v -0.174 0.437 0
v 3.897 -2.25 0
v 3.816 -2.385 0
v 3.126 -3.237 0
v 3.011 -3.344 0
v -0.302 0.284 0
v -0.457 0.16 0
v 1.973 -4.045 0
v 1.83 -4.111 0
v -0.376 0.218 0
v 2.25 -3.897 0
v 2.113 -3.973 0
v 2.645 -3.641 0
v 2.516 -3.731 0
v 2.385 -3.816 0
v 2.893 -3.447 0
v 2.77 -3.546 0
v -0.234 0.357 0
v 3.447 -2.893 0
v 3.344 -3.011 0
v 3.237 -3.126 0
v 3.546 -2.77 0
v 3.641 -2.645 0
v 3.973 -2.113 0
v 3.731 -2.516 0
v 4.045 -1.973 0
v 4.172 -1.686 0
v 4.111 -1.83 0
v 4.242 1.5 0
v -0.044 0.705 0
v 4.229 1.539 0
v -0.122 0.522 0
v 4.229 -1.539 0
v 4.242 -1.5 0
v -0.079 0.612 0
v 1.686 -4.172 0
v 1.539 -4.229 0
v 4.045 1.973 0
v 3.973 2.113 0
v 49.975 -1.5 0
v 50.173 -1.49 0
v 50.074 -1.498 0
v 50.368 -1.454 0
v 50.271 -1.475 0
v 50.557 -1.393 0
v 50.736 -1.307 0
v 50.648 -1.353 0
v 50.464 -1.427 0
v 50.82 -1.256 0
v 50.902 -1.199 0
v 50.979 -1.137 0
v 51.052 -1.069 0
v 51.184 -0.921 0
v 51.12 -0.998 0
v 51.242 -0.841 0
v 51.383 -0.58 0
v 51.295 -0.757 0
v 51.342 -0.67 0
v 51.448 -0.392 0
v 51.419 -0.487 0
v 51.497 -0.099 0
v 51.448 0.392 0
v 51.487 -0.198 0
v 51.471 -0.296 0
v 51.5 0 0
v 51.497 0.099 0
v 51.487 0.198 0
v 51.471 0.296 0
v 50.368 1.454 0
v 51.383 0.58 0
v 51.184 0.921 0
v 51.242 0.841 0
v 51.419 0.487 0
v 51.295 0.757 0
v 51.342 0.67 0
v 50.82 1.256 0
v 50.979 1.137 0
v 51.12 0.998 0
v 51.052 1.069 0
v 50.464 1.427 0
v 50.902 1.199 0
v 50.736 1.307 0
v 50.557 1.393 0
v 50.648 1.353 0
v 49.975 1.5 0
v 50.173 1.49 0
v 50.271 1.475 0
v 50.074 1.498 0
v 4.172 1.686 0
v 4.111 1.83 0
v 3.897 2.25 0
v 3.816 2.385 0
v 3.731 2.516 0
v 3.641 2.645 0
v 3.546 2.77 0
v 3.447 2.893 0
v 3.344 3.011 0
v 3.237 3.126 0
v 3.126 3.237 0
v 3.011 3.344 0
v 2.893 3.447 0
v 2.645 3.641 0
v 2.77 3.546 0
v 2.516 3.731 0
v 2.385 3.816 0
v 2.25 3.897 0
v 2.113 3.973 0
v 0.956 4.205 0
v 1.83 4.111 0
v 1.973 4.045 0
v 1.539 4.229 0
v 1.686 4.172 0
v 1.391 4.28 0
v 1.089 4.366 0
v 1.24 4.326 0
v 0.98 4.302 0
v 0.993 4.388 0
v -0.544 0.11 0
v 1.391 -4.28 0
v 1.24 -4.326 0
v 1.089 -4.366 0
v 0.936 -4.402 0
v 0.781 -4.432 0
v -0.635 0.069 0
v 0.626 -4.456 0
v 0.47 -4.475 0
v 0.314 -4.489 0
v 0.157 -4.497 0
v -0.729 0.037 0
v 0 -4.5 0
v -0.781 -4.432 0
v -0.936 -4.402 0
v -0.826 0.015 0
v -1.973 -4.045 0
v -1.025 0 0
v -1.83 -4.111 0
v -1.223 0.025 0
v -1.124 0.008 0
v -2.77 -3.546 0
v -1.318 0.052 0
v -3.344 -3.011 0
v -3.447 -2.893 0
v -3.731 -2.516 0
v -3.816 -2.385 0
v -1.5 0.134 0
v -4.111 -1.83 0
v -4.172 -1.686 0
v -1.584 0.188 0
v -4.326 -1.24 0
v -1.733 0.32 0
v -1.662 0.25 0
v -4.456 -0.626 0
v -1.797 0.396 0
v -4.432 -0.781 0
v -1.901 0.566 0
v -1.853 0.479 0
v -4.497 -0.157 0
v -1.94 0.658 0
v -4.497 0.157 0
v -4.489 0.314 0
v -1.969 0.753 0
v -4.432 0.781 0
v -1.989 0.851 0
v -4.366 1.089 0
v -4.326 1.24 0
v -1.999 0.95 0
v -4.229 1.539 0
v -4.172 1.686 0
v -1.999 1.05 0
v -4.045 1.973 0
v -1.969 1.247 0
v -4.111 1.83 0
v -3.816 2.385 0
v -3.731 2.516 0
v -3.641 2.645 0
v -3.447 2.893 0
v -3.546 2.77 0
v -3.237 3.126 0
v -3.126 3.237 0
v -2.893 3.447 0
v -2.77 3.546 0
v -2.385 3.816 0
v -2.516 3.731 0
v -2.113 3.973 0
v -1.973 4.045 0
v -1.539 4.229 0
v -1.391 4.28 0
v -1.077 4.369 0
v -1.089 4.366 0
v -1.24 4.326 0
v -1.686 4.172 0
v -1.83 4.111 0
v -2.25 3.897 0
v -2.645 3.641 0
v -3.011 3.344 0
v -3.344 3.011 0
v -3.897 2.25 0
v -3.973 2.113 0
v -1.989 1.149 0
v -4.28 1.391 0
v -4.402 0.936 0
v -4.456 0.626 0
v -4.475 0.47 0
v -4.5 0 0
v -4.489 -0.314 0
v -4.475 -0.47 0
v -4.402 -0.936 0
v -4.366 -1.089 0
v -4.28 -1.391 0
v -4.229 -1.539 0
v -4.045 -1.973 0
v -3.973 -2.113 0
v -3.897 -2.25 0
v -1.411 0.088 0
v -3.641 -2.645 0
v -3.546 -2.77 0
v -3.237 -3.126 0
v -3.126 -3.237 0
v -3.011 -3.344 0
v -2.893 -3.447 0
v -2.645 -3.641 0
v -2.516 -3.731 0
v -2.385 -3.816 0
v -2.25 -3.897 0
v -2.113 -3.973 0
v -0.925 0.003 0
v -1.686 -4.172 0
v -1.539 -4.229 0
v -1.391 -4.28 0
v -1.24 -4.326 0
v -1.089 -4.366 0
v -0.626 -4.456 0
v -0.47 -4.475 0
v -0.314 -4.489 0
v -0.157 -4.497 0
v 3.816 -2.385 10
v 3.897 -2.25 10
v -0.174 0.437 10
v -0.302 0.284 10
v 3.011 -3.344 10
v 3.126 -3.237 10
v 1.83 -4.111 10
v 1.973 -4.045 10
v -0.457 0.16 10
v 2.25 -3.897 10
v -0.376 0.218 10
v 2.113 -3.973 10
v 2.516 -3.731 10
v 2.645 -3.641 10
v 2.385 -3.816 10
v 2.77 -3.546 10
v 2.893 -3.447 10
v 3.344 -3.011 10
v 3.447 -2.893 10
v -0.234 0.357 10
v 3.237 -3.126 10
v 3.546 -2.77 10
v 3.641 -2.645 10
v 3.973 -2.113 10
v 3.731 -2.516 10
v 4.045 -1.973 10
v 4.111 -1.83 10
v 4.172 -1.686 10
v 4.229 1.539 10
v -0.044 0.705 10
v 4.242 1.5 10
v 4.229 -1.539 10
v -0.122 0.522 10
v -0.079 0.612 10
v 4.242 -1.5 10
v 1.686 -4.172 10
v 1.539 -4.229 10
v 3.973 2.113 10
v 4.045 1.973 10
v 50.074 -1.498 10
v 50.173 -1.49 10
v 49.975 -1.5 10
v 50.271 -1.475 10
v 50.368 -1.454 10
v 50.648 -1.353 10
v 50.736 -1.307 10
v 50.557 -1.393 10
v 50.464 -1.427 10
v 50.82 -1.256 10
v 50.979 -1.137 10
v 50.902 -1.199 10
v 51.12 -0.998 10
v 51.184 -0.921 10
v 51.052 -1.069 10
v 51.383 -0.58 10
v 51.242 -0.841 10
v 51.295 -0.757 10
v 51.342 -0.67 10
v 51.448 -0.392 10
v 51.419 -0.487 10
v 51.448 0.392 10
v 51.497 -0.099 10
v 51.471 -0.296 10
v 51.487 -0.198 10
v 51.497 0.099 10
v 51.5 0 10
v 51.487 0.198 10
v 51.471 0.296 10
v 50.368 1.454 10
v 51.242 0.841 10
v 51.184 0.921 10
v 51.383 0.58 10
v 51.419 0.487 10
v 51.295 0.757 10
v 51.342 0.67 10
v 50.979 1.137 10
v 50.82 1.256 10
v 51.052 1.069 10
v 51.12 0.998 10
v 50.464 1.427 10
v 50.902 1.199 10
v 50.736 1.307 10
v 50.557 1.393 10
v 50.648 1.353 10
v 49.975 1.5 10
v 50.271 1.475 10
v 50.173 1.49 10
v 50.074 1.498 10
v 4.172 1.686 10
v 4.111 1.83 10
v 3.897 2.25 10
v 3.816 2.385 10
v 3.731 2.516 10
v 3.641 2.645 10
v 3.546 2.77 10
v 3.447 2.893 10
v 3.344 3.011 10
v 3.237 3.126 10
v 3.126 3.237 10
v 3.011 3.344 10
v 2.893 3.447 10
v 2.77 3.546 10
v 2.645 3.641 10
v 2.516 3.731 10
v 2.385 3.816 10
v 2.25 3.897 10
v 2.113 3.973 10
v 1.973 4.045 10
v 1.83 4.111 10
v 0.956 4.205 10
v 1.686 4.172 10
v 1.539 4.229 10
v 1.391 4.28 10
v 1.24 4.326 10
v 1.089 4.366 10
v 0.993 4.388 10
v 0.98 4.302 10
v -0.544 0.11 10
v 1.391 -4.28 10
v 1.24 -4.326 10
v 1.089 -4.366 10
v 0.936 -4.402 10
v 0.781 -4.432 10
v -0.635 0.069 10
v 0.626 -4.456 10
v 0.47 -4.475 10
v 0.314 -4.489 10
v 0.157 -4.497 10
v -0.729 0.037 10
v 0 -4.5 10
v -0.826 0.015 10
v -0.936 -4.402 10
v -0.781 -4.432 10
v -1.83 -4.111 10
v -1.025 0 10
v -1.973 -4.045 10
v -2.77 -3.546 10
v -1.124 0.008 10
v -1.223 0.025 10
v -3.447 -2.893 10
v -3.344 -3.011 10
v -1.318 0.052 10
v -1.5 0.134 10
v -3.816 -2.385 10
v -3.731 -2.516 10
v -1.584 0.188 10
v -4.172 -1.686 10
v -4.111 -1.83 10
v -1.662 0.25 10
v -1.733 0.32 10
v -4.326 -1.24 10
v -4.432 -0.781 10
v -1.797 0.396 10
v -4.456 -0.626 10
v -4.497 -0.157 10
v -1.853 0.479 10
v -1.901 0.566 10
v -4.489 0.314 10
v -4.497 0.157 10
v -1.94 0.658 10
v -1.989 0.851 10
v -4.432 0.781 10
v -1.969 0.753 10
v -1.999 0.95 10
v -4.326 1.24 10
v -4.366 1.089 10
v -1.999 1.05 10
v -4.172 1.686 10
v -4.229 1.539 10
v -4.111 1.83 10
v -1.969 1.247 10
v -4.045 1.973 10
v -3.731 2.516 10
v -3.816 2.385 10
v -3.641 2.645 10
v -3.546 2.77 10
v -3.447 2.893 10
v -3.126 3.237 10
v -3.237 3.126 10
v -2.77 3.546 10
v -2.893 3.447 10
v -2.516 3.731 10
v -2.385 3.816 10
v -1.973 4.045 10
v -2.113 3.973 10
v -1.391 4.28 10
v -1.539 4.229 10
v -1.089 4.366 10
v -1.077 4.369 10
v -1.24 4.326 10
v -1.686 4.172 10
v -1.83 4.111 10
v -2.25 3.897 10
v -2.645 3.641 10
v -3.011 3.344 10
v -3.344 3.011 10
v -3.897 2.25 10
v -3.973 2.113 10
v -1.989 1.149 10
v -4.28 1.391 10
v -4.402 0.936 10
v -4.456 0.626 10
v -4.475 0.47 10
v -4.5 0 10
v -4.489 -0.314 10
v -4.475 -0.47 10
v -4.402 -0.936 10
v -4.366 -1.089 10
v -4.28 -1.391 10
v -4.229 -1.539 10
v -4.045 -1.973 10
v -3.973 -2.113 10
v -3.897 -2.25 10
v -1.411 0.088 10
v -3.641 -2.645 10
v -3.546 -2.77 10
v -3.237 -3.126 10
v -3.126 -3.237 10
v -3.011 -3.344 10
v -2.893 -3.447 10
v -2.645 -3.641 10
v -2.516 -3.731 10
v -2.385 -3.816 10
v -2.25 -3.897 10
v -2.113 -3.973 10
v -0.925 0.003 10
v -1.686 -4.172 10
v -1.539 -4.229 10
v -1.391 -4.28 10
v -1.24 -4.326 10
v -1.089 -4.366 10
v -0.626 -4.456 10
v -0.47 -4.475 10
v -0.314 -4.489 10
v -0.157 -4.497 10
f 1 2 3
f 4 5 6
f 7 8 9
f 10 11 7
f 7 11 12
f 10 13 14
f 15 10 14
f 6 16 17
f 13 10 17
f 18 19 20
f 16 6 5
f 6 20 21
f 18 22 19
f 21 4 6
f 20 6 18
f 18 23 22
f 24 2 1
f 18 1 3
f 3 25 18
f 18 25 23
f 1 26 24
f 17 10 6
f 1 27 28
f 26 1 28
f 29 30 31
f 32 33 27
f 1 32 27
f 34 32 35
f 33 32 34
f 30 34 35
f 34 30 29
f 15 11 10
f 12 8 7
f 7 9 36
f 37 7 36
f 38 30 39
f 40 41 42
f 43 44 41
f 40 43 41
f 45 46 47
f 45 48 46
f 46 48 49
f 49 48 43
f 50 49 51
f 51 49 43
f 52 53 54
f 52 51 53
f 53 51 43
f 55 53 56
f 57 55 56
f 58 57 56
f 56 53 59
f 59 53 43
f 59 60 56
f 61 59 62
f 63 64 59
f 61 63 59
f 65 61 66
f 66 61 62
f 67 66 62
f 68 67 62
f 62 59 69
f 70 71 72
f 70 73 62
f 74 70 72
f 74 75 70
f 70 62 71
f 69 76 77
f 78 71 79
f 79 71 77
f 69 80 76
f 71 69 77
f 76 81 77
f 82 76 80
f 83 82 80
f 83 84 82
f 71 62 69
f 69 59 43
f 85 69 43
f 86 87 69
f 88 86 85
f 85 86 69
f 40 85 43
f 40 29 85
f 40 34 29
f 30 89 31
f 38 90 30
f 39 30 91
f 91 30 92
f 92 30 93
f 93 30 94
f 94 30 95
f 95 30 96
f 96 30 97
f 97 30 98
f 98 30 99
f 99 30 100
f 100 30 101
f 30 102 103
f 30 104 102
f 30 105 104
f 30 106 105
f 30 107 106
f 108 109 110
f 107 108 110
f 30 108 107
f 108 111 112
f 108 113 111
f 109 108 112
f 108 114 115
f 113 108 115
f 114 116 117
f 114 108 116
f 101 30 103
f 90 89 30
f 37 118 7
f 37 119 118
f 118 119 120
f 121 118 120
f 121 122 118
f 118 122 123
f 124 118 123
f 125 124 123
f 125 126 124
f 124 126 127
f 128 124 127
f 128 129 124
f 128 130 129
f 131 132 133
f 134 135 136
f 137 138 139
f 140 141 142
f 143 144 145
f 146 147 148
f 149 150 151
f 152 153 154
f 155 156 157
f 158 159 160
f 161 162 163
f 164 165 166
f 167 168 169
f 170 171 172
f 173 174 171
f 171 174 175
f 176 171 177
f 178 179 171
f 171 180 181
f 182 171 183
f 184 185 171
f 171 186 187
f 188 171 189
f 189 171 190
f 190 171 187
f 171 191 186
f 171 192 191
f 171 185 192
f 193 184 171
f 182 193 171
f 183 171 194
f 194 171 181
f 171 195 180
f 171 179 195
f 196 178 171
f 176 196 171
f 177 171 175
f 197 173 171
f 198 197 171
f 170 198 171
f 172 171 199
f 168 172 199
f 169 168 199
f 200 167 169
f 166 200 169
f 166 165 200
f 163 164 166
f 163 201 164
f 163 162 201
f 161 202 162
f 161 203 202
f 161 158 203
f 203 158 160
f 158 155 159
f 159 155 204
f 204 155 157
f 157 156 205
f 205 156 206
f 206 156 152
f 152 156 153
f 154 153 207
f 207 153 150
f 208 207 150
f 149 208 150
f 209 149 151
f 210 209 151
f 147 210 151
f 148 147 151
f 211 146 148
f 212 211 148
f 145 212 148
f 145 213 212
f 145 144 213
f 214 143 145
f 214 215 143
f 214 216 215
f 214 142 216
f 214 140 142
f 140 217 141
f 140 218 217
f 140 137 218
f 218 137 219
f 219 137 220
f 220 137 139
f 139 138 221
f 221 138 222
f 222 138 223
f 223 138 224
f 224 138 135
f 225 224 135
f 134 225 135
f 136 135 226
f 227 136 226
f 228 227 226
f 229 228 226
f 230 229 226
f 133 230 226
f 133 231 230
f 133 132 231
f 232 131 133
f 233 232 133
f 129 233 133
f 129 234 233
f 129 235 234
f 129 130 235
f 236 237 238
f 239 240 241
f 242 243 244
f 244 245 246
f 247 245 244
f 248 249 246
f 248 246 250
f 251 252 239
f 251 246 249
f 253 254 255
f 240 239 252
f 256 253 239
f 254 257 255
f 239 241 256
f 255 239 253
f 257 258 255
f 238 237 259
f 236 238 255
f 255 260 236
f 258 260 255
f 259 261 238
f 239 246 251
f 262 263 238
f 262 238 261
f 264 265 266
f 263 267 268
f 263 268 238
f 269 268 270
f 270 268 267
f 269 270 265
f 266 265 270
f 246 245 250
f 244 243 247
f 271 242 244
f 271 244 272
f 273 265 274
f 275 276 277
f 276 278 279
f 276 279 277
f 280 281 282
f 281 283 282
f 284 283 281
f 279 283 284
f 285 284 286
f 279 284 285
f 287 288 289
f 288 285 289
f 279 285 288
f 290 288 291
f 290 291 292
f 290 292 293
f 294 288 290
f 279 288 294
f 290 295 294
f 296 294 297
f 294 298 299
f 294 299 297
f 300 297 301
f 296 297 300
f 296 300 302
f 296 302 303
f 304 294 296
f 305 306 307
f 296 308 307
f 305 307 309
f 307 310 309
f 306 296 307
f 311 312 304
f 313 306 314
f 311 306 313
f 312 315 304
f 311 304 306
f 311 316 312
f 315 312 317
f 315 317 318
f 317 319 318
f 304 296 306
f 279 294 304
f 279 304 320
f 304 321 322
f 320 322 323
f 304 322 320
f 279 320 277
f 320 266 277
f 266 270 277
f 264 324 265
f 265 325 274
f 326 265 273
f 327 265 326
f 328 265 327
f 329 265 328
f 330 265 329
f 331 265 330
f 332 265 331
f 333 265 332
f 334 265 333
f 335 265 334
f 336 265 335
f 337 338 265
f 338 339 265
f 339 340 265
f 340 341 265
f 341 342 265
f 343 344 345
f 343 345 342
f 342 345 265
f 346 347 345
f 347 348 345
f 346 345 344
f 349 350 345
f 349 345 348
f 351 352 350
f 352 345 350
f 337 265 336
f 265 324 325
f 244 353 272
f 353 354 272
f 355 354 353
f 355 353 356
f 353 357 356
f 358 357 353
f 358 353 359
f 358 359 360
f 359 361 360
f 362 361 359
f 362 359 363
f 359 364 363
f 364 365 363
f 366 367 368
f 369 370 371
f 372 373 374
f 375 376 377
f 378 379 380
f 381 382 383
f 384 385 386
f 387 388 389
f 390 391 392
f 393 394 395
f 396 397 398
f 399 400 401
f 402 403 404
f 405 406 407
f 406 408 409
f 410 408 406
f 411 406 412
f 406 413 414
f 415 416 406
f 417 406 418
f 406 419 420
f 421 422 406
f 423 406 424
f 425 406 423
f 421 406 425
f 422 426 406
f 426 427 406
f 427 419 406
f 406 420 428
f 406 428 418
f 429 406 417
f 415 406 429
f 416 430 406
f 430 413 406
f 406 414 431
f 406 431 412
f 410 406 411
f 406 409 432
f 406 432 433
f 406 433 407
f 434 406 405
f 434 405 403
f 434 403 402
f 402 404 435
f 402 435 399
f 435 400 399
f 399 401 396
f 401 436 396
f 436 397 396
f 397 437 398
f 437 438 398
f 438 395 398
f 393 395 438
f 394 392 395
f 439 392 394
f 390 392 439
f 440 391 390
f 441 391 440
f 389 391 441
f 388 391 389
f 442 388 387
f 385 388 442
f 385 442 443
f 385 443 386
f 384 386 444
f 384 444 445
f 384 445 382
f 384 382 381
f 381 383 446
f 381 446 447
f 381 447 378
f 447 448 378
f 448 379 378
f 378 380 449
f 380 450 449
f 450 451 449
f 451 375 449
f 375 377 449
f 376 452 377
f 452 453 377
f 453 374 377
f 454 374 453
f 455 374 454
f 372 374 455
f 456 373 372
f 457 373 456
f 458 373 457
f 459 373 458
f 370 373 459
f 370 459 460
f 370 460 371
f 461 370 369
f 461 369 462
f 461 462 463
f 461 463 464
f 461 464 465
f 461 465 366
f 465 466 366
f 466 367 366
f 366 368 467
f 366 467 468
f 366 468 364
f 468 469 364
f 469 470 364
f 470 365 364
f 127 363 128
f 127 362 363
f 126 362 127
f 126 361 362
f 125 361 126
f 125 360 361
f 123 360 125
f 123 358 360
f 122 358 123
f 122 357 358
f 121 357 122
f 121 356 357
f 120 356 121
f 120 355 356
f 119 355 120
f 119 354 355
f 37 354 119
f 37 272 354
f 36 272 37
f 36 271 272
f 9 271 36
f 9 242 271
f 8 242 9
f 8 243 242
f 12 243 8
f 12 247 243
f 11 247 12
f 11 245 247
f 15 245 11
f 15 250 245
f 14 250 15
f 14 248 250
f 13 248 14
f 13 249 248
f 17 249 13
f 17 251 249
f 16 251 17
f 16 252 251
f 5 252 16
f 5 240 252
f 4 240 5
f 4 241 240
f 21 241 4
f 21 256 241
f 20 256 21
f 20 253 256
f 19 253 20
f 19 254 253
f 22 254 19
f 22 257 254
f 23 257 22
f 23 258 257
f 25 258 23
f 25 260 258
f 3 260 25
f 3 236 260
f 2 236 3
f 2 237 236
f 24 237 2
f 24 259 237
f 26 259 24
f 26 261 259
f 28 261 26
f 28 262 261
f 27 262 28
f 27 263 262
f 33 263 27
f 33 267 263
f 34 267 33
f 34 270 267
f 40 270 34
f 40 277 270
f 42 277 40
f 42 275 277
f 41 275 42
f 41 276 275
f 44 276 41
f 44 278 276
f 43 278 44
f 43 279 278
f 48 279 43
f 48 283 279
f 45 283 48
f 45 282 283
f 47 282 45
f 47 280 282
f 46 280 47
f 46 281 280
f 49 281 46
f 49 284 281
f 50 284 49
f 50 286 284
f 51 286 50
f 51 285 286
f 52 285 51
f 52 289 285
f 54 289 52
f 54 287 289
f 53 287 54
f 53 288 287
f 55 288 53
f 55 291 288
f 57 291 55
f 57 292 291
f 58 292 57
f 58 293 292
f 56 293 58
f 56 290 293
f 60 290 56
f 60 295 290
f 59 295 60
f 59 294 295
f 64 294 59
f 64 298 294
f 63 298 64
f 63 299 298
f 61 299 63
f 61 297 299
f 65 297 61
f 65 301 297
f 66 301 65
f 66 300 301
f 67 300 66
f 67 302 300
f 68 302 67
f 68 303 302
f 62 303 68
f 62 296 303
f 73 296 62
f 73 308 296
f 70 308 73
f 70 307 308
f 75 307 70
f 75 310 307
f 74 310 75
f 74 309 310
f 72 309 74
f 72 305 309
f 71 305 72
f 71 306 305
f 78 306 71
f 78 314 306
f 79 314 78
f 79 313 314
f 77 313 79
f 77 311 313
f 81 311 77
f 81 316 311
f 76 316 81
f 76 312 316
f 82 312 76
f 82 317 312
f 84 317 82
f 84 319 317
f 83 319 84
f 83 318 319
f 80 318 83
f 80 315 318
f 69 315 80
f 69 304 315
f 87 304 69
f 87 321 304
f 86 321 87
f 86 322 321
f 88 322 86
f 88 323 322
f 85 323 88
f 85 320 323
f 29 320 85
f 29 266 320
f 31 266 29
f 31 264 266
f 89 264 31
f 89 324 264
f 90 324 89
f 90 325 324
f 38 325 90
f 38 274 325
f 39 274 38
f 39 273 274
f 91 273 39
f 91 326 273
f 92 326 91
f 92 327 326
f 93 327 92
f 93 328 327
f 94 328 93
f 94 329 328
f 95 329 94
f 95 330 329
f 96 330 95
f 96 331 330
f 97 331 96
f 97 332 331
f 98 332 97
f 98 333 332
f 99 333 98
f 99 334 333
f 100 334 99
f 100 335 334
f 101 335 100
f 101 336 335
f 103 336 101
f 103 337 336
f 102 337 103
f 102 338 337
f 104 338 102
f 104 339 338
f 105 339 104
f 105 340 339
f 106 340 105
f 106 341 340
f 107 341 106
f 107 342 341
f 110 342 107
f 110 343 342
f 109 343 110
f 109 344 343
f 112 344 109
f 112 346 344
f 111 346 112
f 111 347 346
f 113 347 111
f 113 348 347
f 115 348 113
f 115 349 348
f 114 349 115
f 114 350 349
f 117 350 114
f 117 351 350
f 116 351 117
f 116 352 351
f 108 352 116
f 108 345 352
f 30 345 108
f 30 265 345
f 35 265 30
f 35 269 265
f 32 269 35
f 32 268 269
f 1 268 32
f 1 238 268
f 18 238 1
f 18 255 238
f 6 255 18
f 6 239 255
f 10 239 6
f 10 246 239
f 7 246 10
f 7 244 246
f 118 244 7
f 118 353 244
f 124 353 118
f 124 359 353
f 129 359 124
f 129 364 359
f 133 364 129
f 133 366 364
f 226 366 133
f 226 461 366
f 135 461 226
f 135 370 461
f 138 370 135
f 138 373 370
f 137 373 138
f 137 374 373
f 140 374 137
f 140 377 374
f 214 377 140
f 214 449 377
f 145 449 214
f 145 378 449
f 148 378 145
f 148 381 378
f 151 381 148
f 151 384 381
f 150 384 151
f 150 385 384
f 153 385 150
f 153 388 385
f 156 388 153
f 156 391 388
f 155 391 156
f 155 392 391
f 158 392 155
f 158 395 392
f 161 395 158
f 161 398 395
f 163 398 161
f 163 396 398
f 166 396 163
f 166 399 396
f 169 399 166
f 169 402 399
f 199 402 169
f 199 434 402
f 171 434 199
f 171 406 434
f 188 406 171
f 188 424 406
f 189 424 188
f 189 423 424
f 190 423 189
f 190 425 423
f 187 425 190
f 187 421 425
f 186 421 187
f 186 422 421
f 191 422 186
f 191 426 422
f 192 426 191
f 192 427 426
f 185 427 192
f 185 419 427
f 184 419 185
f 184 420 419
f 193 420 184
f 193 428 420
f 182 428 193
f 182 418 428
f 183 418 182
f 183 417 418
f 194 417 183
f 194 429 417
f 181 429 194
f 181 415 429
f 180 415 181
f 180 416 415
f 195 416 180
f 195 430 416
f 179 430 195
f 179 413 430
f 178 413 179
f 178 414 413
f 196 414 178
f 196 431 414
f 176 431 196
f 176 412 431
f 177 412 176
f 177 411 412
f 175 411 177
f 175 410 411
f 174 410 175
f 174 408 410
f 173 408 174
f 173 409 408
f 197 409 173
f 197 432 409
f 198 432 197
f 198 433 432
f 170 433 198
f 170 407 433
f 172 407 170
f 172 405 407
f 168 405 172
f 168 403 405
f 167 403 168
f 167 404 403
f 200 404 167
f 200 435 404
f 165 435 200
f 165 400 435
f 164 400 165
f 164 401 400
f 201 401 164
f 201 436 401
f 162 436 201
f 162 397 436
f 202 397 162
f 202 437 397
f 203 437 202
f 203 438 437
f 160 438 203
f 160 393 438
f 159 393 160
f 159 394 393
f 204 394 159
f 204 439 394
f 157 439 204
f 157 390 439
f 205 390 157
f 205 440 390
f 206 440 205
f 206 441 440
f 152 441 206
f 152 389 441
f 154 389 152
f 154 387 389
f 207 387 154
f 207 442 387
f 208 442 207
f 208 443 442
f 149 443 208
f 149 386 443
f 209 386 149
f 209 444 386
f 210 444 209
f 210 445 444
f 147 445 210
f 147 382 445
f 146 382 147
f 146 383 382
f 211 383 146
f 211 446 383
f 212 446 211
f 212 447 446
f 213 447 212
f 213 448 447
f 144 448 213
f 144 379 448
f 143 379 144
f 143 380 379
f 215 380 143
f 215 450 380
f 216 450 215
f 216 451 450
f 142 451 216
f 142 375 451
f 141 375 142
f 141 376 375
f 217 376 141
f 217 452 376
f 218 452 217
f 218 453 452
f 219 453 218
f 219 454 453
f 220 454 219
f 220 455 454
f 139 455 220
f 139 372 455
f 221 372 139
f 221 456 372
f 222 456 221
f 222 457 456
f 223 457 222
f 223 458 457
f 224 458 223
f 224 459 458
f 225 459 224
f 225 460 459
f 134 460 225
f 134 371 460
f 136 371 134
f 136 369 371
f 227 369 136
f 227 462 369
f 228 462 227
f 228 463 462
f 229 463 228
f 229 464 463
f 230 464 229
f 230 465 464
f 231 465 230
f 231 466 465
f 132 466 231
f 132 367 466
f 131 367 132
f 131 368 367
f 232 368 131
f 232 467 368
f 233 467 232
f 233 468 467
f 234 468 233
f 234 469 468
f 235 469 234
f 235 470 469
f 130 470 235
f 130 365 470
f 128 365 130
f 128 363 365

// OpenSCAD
$fs = $preview ? 1 : 0.1;
$fa = $preview ? 3 : 2;

inner_d = 2;
handle_width = 3;
handle_length = 50;
outer_d = 9;
width = 10;

linear_extrude(width) {
  difference() {
    union() {
      circle(d = outer_d);
      hull() {
        circle(d = handle_width);
        translate([handle_length, 0])
          circle(d = handle_width);
      }
    }
    hull() {
      translate([-inner_d / 2, inner_d / 2])
        circle(d = inner_d);
      translate([0, outer_d / 2])
        circle(d = inner_d);
    }
  }
}
